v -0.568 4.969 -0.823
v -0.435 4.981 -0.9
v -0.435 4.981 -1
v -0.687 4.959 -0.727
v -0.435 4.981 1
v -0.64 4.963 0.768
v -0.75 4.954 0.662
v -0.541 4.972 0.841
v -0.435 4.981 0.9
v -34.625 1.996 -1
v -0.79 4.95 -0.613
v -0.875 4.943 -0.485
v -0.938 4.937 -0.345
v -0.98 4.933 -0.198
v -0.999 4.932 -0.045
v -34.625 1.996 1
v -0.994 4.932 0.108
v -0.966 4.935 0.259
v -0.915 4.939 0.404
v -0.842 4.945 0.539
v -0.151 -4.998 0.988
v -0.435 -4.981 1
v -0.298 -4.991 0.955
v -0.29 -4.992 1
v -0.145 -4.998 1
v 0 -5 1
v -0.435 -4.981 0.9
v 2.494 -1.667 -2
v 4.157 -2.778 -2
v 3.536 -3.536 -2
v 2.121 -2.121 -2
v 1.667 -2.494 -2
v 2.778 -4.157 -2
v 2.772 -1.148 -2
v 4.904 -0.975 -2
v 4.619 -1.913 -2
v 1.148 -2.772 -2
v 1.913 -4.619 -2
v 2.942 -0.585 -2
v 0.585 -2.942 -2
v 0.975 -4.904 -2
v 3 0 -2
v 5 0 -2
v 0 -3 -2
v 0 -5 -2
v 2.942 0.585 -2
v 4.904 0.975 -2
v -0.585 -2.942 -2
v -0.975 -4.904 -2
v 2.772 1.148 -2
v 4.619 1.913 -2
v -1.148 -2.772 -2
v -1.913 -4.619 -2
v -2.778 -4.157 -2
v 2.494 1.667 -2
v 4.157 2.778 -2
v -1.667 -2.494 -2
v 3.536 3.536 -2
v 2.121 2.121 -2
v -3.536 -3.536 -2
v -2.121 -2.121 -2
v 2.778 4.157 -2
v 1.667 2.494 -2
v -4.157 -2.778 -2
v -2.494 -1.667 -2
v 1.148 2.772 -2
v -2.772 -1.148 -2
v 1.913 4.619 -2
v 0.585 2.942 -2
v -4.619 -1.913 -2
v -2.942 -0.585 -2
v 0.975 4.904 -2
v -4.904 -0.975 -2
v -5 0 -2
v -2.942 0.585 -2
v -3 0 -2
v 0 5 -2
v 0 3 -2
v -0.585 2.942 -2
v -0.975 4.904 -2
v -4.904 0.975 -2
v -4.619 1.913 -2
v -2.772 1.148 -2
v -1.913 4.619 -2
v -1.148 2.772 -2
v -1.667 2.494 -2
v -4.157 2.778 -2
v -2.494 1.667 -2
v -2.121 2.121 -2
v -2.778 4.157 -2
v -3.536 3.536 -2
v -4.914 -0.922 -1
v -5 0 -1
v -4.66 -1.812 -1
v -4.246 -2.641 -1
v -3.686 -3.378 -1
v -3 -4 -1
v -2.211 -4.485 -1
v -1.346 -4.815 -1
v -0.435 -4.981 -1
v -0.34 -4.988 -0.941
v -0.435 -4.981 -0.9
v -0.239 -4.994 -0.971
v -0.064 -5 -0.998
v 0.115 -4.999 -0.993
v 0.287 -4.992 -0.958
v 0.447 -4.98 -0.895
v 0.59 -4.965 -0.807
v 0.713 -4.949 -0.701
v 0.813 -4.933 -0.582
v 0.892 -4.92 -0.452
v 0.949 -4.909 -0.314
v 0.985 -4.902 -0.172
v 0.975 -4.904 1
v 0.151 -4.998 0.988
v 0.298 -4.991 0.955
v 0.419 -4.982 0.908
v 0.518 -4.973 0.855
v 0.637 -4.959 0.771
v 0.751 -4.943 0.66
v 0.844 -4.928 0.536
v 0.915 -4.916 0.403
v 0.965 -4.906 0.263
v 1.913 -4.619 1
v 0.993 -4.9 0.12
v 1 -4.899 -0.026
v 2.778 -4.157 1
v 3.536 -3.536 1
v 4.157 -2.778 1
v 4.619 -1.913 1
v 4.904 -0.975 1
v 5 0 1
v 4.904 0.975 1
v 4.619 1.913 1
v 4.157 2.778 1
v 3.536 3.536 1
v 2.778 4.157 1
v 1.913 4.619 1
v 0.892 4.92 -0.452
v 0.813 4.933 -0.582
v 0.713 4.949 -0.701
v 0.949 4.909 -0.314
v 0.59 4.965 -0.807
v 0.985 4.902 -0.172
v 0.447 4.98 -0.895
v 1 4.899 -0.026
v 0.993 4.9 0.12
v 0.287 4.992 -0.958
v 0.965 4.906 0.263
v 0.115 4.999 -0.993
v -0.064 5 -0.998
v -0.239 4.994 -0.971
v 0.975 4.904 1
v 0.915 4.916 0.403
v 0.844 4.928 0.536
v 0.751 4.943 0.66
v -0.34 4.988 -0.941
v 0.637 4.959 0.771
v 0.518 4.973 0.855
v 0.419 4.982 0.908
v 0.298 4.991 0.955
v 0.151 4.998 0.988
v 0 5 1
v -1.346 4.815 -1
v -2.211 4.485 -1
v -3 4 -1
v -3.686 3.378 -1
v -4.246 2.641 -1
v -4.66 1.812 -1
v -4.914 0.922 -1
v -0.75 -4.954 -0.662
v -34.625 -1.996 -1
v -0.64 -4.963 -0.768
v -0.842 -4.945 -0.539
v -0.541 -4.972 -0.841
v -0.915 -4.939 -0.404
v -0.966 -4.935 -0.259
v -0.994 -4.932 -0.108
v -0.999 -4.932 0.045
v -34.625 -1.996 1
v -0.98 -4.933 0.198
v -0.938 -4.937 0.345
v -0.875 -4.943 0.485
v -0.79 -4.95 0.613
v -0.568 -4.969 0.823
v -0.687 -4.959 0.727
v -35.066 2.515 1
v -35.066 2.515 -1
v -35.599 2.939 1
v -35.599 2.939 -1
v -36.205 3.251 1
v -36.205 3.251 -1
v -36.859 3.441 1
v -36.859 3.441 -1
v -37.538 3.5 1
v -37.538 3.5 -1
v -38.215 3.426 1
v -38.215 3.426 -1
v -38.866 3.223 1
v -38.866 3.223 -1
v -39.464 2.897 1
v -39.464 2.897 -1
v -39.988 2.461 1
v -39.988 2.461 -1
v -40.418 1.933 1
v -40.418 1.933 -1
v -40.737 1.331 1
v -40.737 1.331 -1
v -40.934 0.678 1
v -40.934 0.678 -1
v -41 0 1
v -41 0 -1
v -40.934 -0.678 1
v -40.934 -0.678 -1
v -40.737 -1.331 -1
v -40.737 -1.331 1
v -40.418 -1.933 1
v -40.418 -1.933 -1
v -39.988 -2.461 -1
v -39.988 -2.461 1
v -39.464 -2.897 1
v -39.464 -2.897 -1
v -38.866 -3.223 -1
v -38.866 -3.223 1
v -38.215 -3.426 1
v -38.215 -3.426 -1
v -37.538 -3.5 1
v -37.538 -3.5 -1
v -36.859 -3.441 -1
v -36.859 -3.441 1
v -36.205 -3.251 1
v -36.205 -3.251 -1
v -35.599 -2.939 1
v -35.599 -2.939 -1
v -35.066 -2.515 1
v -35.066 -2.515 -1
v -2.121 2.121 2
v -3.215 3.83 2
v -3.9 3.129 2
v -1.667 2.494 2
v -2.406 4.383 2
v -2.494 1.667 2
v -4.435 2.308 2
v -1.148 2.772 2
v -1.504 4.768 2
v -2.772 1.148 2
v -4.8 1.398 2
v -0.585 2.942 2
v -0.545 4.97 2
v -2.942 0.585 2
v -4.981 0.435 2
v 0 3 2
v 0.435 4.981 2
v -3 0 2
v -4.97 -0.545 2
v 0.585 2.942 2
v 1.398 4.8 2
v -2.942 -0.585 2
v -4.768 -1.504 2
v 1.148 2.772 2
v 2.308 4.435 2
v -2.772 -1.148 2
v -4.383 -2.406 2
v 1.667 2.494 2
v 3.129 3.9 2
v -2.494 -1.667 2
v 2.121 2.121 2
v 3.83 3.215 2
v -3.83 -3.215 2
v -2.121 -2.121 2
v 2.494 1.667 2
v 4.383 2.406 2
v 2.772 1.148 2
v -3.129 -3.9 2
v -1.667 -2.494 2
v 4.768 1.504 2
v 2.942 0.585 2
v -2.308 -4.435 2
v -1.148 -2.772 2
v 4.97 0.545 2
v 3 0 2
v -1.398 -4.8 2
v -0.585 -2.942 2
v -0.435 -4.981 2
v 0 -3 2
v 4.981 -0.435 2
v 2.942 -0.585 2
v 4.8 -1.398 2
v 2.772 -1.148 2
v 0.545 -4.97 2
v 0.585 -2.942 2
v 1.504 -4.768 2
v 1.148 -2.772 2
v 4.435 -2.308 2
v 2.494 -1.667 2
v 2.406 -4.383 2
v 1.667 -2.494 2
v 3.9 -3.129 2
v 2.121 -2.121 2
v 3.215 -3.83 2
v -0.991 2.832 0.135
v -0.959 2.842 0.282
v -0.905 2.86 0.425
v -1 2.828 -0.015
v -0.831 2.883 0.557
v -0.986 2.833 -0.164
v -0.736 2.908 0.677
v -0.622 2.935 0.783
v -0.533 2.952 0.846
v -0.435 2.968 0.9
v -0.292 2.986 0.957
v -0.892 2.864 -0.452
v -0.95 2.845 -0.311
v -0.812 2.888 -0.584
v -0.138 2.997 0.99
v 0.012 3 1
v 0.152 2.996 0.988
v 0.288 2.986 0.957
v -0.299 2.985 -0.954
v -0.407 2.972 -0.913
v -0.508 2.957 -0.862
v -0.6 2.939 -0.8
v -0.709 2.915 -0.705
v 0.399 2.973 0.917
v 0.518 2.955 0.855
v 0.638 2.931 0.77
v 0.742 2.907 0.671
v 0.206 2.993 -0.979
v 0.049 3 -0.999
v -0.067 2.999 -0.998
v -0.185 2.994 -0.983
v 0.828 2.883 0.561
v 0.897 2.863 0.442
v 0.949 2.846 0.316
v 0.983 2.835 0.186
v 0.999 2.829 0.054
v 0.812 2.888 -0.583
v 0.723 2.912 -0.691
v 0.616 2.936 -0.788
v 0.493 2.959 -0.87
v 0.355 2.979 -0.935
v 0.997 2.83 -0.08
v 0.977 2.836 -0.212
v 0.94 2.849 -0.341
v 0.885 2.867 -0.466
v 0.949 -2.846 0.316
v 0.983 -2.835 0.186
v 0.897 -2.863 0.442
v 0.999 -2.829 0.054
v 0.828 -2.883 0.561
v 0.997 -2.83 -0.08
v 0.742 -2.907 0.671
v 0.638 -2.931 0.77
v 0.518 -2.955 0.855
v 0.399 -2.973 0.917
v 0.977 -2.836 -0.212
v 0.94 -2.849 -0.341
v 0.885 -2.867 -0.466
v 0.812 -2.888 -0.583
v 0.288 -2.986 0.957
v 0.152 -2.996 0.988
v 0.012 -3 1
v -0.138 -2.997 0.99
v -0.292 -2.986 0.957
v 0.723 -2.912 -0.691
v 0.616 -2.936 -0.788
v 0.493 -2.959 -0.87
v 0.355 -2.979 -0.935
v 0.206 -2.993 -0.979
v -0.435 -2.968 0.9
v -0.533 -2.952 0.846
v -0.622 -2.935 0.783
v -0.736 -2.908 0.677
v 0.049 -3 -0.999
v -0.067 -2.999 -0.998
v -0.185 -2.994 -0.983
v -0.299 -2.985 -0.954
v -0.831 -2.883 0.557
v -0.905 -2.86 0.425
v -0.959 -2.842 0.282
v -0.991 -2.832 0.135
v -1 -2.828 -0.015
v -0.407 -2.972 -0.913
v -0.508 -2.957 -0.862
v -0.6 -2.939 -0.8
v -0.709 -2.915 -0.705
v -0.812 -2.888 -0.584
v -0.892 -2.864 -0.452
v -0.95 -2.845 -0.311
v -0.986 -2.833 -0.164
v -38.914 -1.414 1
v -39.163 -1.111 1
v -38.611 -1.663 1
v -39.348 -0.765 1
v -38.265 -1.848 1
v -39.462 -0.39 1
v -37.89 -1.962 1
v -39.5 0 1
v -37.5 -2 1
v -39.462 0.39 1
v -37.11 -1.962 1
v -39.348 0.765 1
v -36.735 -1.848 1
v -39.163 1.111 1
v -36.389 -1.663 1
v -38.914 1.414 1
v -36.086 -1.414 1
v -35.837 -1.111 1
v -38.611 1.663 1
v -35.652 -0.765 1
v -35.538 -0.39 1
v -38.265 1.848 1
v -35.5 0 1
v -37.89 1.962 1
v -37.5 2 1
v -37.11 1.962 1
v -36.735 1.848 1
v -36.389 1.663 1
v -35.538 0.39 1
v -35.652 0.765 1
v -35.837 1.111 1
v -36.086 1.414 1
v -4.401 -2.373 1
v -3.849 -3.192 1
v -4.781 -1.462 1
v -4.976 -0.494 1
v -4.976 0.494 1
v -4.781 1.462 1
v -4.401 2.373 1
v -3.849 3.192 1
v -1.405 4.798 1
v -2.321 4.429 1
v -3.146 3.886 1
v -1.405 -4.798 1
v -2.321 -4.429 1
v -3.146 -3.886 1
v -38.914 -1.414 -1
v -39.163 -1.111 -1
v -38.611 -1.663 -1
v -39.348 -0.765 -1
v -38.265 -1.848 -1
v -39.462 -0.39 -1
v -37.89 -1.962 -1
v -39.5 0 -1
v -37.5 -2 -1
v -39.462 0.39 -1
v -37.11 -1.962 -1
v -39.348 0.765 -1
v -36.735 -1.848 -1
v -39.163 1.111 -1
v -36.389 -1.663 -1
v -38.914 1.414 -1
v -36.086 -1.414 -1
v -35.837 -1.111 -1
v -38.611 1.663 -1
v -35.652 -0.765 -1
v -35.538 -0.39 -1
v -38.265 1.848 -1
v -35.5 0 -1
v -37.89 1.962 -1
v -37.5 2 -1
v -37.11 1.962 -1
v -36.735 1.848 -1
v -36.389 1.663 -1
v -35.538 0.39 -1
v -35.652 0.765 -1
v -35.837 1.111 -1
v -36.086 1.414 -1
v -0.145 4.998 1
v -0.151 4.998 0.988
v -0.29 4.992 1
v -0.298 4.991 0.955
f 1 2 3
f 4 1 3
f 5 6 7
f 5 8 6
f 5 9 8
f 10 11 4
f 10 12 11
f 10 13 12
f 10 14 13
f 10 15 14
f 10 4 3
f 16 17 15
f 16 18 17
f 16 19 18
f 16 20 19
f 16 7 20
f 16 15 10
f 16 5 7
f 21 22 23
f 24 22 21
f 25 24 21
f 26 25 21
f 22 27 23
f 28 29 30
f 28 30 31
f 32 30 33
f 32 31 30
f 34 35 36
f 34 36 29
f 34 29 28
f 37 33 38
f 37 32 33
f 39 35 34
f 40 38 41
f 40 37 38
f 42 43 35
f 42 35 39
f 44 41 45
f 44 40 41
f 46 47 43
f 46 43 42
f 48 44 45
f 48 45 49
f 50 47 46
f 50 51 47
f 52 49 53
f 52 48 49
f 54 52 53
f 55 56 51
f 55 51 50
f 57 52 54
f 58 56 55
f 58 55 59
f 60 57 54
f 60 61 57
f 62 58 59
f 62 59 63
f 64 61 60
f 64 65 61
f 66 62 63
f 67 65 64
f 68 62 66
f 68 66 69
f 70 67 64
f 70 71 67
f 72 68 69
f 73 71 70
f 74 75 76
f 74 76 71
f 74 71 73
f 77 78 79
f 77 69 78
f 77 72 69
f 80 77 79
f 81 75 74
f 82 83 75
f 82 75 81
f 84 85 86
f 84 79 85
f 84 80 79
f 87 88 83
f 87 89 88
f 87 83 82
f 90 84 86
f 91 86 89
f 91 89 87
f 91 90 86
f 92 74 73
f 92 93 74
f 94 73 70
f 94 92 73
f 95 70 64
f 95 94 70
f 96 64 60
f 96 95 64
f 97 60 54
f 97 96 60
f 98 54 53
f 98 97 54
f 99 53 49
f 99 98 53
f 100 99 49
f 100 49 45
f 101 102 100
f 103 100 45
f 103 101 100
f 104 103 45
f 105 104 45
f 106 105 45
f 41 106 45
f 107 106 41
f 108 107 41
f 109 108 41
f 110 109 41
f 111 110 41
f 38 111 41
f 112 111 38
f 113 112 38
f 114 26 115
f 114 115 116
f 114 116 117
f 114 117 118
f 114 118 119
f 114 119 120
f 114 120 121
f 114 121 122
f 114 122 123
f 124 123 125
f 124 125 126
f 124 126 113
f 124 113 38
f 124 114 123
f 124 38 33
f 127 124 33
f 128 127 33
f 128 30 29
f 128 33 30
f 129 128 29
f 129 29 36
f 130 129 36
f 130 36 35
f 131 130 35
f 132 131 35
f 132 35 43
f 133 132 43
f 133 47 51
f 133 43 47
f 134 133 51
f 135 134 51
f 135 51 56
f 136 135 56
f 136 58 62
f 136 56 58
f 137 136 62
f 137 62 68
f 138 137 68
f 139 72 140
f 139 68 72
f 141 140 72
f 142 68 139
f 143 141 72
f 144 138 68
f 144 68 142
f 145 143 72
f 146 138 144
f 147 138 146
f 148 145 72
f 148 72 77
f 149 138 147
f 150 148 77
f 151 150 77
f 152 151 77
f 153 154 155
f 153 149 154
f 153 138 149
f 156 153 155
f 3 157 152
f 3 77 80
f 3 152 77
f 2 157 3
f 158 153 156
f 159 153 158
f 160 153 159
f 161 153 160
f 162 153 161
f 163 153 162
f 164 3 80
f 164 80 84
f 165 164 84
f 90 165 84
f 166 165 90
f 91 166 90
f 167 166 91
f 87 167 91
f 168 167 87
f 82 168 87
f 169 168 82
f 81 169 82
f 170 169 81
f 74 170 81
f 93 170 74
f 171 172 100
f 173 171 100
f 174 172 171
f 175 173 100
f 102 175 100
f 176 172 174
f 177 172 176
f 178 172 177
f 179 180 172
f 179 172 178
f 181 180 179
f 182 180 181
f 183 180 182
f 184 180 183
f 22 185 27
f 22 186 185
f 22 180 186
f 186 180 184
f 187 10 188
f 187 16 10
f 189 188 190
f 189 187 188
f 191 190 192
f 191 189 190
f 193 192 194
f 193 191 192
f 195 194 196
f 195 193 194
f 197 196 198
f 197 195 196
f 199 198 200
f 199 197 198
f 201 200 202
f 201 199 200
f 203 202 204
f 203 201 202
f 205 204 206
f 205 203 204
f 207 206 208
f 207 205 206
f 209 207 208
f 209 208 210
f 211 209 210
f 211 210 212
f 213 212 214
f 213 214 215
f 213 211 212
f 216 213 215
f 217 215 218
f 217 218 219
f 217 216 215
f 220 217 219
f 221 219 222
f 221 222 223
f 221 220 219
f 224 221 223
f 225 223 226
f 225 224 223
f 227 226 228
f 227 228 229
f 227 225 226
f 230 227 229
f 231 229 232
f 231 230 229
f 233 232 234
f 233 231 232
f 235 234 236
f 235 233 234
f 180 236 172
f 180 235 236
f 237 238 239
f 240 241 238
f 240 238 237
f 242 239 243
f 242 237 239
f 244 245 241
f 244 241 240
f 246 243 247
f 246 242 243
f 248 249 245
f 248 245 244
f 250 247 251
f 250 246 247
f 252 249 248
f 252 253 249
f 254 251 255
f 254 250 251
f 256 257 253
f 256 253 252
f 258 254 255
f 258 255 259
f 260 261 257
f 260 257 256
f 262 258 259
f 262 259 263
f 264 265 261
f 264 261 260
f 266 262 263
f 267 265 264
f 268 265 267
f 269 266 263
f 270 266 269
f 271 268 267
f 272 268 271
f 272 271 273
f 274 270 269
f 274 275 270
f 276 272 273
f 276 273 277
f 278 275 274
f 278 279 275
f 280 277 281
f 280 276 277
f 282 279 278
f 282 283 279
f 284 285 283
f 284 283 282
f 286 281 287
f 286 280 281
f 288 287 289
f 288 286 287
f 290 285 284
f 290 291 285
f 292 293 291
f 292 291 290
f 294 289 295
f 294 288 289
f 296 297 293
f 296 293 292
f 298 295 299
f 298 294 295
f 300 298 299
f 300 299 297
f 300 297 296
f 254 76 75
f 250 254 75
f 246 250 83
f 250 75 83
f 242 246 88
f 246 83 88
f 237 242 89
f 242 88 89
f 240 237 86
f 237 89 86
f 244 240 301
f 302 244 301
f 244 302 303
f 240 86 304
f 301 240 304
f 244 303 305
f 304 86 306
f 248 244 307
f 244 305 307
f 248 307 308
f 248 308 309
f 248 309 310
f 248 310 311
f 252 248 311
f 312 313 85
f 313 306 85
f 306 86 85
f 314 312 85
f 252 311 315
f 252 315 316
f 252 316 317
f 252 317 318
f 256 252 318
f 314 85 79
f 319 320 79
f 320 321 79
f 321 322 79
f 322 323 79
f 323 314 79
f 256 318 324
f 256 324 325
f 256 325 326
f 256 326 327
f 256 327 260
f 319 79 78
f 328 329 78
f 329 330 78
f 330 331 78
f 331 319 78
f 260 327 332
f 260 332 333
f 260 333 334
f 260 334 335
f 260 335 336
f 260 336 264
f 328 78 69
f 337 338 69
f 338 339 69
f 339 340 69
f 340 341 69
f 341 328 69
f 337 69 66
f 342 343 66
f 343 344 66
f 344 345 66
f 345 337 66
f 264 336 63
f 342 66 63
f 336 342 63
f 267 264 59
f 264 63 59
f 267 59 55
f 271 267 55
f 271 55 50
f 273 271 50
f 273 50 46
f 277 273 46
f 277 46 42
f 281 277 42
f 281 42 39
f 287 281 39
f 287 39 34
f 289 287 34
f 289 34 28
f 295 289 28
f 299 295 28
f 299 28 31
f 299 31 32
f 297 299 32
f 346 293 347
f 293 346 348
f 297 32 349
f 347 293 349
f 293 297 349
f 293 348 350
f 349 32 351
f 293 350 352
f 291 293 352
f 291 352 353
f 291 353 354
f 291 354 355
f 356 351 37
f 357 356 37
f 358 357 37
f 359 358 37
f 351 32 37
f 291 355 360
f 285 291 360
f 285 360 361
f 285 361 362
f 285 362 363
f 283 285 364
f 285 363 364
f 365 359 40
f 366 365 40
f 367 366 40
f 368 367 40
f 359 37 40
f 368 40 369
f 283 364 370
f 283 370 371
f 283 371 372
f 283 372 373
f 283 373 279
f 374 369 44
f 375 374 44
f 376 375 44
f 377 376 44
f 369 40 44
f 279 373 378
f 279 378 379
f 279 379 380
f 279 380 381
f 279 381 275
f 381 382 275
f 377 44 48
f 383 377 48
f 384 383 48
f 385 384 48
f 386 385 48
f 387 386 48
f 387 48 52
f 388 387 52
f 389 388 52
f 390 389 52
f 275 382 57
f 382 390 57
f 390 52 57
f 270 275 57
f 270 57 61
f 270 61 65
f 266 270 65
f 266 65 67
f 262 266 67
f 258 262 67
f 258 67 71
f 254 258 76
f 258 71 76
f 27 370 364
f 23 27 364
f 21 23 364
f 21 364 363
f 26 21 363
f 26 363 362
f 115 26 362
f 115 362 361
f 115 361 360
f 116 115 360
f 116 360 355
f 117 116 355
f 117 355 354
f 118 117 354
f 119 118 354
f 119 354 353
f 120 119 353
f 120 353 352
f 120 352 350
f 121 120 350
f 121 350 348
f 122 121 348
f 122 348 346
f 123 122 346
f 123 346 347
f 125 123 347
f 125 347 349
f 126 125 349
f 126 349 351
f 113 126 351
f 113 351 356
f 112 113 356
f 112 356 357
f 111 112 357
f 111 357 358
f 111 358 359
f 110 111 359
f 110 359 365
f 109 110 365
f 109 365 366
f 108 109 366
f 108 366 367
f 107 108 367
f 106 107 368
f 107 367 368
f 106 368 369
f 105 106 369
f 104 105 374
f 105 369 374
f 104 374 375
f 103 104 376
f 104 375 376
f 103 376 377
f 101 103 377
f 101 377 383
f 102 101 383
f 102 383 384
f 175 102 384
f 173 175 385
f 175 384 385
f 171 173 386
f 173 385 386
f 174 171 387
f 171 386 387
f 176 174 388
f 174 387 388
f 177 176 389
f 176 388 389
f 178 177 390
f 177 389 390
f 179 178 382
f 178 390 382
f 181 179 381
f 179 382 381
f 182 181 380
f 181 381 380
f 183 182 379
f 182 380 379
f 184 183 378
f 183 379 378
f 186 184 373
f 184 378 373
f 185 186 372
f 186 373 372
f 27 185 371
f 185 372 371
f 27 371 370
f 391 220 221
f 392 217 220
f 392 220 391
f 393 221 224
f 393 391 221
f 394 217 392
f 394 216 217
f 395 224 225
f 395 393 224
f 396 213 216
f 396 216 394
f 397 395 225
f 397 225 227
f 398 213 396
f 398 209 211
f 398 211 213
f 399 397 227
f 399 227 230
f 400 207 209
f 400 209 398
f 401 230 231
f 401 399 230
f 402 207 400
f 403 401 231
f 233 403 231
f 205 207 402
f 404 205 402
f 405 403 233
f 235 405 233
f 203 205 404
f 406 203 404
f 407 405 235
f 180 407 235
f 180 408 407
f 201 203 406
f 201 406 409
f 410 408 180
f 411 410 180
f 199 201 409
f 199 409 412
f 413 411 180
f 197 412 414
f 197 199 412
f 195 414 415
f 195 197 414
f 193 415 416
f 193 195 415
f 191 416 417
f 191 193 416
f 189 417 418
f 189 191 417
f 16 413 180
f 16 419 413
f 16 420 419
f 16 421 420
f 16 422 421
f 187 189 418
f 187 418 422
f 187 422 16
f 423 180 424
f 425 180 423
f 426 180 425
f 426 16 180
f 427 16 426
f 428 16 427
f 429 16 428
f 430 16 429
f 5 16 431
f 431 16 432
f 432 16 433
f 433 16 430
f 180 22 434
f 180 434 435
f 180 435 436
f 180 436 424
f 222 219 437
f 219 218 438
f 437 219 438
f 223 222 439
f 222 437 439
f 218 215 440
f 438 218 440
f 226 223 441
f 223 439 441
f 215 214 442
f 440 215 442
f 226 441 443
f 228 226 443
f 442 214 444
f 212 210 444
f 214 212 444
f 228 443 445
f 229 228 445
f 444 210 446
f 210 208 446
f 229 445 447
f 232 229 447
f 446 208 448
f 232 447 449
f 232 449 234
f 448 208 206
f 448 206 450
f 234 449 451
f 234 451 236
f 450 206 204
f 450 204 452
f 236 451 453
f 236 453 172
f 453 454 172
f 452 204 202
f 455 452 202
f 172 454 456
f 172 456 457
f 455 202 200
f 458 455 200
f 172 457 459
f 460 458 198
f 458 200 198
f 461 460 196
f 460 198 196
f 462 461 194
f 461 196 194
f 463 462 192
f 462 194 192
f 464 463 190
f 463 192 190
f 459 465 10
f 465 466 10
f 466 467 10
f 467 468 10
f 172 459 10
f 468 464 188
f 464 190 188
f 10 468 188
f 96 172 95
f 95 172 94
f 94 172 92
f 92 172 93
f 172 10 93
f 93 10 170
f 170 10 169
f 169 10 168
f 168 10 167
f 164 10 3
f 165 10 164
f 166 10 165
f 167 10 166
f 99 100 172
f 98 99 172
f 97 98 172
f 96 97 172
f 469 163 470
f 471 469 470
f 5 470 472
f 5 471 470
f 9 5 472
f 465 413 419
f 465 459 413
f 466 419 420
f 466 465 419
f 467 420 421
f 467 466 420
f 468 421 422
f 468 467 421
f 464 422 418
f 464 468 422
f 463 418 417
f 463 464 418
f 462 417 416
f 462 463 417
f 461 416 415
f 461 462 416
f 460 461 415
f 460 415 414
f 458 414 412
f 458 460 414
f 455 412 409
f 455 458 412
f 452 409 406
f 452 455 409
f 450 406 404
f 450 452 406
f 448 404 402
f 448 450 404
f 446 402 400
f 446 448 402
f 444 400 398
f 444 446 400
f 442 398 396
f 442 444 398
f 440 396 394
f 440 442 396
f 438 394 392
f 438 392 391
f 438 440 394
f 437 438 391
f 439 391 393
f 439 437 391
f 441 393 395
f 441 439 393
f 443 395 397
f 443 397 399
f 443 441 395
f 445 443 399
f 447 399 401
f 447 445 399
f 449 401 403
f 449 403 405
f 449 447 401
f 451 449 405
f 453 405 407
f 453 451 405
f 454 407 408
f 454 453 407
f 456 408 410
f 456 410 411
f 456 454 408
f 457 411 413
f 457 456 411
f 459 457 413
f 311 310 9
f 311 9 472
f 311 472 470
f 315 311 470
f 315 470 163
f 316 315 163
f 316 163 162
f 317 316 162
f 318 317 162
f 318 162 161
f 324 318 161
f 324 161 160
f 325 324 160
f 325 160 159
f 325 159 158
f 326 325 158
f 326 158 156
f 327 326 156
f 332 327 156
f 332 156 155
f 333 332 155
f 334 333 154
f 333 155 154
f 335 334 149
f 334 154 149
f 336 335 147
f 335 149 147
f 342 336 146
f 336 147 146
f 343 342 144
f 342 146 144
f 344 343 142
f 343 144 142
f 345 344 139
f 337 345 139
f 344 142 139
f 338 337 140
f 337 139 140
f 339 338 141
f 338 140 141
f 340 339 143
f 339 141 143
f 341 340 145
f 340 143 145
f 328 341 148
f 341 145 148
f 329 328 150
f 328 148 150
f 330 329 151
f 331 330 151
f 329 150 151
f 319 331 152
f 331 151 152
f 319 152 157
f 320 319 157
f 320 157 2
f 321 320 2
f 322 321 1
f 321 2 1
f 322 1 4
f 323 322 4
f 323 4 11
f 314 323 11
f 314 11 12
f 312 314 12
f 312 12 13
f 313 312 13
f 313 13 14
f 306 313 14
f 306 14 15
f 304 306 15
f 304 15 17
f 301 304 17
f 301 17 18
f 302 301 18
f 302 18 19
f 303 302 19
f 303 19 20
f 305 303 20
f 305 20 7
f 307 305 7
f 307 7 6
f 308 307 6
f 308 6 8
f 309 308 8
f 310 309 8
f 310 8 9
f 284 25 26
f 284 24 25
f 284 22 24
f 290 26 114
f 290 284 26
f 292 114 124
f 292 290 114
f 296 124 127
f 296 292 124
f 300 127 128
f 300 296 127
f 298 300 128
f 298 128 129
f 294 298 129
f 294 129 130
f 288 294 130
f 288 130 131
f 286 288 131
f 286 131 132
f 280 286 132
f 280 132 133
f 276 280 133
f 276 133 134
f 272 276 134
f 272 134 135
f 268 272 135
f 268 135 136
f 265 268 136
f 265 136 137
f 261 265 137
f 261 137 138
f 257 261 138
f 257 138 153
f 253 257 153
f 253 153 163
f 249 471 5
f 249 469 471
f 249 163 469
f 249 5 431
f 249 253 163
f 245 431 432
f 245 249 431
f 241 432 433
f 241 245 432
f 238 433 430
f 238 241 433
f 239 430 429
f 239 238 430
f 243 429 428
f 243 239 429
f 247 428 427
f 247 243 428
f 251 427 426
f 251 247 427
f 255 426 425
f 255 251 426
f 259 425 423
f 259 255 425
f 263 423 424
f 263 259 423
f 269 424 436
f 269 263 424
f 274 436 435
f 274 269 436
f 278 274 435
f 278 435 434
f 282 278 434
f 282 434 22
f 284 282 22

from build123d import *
from build123d.topology import SkipClean

# Parameters (mm, degrees)
SKETCH1_R           = 5
SKETCH1_R_2         = 3
SKETCH1_R_3         = 2
BOSS_EXTRUDE1_DEPTH = 1
SKETCH2_R           = 5
BOSS_EXTRUDE2_DEPTH = 1
SKETCH3_R           = 5
BOSS_EXTRUDE3_DEPTH = 1
SKETCH4_R           = 1
CUT_EXTRUDE1_DEPTH  = 25
SKETCH5_R           = 3
CUT_EXTRUDE2_DEPTH  = 10


with BuildPart() as part:
    # Sketch1 → Boss-Extrude1 (new, symmetric)
    # profile 1 of 2: a face of its own
    with BuildSketch(Plane.XY):
        Circle(SKETCH1_R)
        Circle(SKETCH1_R_2, mode=Mode.SUBTRACT)
    # profile 2 of 2: a face of its own
    with BuildSketch(Plane.XY):
        with BuildLine():
            ThreePointArc((-34.624678, 1.995626), (-41, 0), (-34.624678, -1.995626))
            Line((-34.624678, -1.995626), (-0.434941, -4.981047))
            ThreePointArc((-0.434941, -4.981047), (-5, 0), (-0.434941, 4.981047))
            Line((-0.434941, 4.981047), (-34.624678, 1.995626))
        make_face()
        with Locations((-37.5, 0)):
            Circle(SKETCH1_R_3, mode=Mode.SUBTRACT)
    extrude(amount=BOSS_EXTRUDE1_DEPTH, both=True)

    # Sketch2 → Boss-Extrude2 (add, symmetric)
    with BuildSketch(Plane.XY.offset(1)):
        with Locations(Location((0, 0, 0), (0, 0, 265.009636))):
            Circle(SKETCH2_R)
    extrude(amount=BOSS_EXTRUDE2_DEPTH, both=True)

    # Sketch3 → Boss-Extrude3 (add, symmetric)
    with BuildSketch(Plane(origin=(0, 0, -1), x_dir=(-1, 0, 0), z_dir=(0, 0, -1))):
        Circle(SKETCH3_R)
    extrude(amount=BOSS_EXTRUDE3_DEPTH, both=True)

    # Sketch4 → Cut-Extrude1 (cut, symmetric)
    with SkipClean():  # the faces are left unmerged after this step: merging them gives an invalid solid
        with BuildSketch(Plane(origin=(0, 0, 0), x_dir=(1, 0, 0), z_dir=(0, 1, 0))):
            with Locations(Location((0, 0, 0), (0, 0, 244.218462))):
                Circle(SKETCH4_R)
        extrude(amount=CUT_EXTRUDE1_DEPTH, both=True, mode=Mode.SUBTRACT)

    # Sketch5 → Cut-Extrude2 (cut)
    with SkipClean():  # the faces are left unmerged after this step: merging them gives an invalid solid
        with BuildSketch(Plane(origin=(0, 0, -2), x_dir=(-1, 0, 0), z_dir=(0, 0, -1))):
            Circle(SKETCH5_R)
        extrude(amount=-CUT_EXTRUDE2_DEPTH, mode=Mode.SUBTRACT)


solid = part.part
